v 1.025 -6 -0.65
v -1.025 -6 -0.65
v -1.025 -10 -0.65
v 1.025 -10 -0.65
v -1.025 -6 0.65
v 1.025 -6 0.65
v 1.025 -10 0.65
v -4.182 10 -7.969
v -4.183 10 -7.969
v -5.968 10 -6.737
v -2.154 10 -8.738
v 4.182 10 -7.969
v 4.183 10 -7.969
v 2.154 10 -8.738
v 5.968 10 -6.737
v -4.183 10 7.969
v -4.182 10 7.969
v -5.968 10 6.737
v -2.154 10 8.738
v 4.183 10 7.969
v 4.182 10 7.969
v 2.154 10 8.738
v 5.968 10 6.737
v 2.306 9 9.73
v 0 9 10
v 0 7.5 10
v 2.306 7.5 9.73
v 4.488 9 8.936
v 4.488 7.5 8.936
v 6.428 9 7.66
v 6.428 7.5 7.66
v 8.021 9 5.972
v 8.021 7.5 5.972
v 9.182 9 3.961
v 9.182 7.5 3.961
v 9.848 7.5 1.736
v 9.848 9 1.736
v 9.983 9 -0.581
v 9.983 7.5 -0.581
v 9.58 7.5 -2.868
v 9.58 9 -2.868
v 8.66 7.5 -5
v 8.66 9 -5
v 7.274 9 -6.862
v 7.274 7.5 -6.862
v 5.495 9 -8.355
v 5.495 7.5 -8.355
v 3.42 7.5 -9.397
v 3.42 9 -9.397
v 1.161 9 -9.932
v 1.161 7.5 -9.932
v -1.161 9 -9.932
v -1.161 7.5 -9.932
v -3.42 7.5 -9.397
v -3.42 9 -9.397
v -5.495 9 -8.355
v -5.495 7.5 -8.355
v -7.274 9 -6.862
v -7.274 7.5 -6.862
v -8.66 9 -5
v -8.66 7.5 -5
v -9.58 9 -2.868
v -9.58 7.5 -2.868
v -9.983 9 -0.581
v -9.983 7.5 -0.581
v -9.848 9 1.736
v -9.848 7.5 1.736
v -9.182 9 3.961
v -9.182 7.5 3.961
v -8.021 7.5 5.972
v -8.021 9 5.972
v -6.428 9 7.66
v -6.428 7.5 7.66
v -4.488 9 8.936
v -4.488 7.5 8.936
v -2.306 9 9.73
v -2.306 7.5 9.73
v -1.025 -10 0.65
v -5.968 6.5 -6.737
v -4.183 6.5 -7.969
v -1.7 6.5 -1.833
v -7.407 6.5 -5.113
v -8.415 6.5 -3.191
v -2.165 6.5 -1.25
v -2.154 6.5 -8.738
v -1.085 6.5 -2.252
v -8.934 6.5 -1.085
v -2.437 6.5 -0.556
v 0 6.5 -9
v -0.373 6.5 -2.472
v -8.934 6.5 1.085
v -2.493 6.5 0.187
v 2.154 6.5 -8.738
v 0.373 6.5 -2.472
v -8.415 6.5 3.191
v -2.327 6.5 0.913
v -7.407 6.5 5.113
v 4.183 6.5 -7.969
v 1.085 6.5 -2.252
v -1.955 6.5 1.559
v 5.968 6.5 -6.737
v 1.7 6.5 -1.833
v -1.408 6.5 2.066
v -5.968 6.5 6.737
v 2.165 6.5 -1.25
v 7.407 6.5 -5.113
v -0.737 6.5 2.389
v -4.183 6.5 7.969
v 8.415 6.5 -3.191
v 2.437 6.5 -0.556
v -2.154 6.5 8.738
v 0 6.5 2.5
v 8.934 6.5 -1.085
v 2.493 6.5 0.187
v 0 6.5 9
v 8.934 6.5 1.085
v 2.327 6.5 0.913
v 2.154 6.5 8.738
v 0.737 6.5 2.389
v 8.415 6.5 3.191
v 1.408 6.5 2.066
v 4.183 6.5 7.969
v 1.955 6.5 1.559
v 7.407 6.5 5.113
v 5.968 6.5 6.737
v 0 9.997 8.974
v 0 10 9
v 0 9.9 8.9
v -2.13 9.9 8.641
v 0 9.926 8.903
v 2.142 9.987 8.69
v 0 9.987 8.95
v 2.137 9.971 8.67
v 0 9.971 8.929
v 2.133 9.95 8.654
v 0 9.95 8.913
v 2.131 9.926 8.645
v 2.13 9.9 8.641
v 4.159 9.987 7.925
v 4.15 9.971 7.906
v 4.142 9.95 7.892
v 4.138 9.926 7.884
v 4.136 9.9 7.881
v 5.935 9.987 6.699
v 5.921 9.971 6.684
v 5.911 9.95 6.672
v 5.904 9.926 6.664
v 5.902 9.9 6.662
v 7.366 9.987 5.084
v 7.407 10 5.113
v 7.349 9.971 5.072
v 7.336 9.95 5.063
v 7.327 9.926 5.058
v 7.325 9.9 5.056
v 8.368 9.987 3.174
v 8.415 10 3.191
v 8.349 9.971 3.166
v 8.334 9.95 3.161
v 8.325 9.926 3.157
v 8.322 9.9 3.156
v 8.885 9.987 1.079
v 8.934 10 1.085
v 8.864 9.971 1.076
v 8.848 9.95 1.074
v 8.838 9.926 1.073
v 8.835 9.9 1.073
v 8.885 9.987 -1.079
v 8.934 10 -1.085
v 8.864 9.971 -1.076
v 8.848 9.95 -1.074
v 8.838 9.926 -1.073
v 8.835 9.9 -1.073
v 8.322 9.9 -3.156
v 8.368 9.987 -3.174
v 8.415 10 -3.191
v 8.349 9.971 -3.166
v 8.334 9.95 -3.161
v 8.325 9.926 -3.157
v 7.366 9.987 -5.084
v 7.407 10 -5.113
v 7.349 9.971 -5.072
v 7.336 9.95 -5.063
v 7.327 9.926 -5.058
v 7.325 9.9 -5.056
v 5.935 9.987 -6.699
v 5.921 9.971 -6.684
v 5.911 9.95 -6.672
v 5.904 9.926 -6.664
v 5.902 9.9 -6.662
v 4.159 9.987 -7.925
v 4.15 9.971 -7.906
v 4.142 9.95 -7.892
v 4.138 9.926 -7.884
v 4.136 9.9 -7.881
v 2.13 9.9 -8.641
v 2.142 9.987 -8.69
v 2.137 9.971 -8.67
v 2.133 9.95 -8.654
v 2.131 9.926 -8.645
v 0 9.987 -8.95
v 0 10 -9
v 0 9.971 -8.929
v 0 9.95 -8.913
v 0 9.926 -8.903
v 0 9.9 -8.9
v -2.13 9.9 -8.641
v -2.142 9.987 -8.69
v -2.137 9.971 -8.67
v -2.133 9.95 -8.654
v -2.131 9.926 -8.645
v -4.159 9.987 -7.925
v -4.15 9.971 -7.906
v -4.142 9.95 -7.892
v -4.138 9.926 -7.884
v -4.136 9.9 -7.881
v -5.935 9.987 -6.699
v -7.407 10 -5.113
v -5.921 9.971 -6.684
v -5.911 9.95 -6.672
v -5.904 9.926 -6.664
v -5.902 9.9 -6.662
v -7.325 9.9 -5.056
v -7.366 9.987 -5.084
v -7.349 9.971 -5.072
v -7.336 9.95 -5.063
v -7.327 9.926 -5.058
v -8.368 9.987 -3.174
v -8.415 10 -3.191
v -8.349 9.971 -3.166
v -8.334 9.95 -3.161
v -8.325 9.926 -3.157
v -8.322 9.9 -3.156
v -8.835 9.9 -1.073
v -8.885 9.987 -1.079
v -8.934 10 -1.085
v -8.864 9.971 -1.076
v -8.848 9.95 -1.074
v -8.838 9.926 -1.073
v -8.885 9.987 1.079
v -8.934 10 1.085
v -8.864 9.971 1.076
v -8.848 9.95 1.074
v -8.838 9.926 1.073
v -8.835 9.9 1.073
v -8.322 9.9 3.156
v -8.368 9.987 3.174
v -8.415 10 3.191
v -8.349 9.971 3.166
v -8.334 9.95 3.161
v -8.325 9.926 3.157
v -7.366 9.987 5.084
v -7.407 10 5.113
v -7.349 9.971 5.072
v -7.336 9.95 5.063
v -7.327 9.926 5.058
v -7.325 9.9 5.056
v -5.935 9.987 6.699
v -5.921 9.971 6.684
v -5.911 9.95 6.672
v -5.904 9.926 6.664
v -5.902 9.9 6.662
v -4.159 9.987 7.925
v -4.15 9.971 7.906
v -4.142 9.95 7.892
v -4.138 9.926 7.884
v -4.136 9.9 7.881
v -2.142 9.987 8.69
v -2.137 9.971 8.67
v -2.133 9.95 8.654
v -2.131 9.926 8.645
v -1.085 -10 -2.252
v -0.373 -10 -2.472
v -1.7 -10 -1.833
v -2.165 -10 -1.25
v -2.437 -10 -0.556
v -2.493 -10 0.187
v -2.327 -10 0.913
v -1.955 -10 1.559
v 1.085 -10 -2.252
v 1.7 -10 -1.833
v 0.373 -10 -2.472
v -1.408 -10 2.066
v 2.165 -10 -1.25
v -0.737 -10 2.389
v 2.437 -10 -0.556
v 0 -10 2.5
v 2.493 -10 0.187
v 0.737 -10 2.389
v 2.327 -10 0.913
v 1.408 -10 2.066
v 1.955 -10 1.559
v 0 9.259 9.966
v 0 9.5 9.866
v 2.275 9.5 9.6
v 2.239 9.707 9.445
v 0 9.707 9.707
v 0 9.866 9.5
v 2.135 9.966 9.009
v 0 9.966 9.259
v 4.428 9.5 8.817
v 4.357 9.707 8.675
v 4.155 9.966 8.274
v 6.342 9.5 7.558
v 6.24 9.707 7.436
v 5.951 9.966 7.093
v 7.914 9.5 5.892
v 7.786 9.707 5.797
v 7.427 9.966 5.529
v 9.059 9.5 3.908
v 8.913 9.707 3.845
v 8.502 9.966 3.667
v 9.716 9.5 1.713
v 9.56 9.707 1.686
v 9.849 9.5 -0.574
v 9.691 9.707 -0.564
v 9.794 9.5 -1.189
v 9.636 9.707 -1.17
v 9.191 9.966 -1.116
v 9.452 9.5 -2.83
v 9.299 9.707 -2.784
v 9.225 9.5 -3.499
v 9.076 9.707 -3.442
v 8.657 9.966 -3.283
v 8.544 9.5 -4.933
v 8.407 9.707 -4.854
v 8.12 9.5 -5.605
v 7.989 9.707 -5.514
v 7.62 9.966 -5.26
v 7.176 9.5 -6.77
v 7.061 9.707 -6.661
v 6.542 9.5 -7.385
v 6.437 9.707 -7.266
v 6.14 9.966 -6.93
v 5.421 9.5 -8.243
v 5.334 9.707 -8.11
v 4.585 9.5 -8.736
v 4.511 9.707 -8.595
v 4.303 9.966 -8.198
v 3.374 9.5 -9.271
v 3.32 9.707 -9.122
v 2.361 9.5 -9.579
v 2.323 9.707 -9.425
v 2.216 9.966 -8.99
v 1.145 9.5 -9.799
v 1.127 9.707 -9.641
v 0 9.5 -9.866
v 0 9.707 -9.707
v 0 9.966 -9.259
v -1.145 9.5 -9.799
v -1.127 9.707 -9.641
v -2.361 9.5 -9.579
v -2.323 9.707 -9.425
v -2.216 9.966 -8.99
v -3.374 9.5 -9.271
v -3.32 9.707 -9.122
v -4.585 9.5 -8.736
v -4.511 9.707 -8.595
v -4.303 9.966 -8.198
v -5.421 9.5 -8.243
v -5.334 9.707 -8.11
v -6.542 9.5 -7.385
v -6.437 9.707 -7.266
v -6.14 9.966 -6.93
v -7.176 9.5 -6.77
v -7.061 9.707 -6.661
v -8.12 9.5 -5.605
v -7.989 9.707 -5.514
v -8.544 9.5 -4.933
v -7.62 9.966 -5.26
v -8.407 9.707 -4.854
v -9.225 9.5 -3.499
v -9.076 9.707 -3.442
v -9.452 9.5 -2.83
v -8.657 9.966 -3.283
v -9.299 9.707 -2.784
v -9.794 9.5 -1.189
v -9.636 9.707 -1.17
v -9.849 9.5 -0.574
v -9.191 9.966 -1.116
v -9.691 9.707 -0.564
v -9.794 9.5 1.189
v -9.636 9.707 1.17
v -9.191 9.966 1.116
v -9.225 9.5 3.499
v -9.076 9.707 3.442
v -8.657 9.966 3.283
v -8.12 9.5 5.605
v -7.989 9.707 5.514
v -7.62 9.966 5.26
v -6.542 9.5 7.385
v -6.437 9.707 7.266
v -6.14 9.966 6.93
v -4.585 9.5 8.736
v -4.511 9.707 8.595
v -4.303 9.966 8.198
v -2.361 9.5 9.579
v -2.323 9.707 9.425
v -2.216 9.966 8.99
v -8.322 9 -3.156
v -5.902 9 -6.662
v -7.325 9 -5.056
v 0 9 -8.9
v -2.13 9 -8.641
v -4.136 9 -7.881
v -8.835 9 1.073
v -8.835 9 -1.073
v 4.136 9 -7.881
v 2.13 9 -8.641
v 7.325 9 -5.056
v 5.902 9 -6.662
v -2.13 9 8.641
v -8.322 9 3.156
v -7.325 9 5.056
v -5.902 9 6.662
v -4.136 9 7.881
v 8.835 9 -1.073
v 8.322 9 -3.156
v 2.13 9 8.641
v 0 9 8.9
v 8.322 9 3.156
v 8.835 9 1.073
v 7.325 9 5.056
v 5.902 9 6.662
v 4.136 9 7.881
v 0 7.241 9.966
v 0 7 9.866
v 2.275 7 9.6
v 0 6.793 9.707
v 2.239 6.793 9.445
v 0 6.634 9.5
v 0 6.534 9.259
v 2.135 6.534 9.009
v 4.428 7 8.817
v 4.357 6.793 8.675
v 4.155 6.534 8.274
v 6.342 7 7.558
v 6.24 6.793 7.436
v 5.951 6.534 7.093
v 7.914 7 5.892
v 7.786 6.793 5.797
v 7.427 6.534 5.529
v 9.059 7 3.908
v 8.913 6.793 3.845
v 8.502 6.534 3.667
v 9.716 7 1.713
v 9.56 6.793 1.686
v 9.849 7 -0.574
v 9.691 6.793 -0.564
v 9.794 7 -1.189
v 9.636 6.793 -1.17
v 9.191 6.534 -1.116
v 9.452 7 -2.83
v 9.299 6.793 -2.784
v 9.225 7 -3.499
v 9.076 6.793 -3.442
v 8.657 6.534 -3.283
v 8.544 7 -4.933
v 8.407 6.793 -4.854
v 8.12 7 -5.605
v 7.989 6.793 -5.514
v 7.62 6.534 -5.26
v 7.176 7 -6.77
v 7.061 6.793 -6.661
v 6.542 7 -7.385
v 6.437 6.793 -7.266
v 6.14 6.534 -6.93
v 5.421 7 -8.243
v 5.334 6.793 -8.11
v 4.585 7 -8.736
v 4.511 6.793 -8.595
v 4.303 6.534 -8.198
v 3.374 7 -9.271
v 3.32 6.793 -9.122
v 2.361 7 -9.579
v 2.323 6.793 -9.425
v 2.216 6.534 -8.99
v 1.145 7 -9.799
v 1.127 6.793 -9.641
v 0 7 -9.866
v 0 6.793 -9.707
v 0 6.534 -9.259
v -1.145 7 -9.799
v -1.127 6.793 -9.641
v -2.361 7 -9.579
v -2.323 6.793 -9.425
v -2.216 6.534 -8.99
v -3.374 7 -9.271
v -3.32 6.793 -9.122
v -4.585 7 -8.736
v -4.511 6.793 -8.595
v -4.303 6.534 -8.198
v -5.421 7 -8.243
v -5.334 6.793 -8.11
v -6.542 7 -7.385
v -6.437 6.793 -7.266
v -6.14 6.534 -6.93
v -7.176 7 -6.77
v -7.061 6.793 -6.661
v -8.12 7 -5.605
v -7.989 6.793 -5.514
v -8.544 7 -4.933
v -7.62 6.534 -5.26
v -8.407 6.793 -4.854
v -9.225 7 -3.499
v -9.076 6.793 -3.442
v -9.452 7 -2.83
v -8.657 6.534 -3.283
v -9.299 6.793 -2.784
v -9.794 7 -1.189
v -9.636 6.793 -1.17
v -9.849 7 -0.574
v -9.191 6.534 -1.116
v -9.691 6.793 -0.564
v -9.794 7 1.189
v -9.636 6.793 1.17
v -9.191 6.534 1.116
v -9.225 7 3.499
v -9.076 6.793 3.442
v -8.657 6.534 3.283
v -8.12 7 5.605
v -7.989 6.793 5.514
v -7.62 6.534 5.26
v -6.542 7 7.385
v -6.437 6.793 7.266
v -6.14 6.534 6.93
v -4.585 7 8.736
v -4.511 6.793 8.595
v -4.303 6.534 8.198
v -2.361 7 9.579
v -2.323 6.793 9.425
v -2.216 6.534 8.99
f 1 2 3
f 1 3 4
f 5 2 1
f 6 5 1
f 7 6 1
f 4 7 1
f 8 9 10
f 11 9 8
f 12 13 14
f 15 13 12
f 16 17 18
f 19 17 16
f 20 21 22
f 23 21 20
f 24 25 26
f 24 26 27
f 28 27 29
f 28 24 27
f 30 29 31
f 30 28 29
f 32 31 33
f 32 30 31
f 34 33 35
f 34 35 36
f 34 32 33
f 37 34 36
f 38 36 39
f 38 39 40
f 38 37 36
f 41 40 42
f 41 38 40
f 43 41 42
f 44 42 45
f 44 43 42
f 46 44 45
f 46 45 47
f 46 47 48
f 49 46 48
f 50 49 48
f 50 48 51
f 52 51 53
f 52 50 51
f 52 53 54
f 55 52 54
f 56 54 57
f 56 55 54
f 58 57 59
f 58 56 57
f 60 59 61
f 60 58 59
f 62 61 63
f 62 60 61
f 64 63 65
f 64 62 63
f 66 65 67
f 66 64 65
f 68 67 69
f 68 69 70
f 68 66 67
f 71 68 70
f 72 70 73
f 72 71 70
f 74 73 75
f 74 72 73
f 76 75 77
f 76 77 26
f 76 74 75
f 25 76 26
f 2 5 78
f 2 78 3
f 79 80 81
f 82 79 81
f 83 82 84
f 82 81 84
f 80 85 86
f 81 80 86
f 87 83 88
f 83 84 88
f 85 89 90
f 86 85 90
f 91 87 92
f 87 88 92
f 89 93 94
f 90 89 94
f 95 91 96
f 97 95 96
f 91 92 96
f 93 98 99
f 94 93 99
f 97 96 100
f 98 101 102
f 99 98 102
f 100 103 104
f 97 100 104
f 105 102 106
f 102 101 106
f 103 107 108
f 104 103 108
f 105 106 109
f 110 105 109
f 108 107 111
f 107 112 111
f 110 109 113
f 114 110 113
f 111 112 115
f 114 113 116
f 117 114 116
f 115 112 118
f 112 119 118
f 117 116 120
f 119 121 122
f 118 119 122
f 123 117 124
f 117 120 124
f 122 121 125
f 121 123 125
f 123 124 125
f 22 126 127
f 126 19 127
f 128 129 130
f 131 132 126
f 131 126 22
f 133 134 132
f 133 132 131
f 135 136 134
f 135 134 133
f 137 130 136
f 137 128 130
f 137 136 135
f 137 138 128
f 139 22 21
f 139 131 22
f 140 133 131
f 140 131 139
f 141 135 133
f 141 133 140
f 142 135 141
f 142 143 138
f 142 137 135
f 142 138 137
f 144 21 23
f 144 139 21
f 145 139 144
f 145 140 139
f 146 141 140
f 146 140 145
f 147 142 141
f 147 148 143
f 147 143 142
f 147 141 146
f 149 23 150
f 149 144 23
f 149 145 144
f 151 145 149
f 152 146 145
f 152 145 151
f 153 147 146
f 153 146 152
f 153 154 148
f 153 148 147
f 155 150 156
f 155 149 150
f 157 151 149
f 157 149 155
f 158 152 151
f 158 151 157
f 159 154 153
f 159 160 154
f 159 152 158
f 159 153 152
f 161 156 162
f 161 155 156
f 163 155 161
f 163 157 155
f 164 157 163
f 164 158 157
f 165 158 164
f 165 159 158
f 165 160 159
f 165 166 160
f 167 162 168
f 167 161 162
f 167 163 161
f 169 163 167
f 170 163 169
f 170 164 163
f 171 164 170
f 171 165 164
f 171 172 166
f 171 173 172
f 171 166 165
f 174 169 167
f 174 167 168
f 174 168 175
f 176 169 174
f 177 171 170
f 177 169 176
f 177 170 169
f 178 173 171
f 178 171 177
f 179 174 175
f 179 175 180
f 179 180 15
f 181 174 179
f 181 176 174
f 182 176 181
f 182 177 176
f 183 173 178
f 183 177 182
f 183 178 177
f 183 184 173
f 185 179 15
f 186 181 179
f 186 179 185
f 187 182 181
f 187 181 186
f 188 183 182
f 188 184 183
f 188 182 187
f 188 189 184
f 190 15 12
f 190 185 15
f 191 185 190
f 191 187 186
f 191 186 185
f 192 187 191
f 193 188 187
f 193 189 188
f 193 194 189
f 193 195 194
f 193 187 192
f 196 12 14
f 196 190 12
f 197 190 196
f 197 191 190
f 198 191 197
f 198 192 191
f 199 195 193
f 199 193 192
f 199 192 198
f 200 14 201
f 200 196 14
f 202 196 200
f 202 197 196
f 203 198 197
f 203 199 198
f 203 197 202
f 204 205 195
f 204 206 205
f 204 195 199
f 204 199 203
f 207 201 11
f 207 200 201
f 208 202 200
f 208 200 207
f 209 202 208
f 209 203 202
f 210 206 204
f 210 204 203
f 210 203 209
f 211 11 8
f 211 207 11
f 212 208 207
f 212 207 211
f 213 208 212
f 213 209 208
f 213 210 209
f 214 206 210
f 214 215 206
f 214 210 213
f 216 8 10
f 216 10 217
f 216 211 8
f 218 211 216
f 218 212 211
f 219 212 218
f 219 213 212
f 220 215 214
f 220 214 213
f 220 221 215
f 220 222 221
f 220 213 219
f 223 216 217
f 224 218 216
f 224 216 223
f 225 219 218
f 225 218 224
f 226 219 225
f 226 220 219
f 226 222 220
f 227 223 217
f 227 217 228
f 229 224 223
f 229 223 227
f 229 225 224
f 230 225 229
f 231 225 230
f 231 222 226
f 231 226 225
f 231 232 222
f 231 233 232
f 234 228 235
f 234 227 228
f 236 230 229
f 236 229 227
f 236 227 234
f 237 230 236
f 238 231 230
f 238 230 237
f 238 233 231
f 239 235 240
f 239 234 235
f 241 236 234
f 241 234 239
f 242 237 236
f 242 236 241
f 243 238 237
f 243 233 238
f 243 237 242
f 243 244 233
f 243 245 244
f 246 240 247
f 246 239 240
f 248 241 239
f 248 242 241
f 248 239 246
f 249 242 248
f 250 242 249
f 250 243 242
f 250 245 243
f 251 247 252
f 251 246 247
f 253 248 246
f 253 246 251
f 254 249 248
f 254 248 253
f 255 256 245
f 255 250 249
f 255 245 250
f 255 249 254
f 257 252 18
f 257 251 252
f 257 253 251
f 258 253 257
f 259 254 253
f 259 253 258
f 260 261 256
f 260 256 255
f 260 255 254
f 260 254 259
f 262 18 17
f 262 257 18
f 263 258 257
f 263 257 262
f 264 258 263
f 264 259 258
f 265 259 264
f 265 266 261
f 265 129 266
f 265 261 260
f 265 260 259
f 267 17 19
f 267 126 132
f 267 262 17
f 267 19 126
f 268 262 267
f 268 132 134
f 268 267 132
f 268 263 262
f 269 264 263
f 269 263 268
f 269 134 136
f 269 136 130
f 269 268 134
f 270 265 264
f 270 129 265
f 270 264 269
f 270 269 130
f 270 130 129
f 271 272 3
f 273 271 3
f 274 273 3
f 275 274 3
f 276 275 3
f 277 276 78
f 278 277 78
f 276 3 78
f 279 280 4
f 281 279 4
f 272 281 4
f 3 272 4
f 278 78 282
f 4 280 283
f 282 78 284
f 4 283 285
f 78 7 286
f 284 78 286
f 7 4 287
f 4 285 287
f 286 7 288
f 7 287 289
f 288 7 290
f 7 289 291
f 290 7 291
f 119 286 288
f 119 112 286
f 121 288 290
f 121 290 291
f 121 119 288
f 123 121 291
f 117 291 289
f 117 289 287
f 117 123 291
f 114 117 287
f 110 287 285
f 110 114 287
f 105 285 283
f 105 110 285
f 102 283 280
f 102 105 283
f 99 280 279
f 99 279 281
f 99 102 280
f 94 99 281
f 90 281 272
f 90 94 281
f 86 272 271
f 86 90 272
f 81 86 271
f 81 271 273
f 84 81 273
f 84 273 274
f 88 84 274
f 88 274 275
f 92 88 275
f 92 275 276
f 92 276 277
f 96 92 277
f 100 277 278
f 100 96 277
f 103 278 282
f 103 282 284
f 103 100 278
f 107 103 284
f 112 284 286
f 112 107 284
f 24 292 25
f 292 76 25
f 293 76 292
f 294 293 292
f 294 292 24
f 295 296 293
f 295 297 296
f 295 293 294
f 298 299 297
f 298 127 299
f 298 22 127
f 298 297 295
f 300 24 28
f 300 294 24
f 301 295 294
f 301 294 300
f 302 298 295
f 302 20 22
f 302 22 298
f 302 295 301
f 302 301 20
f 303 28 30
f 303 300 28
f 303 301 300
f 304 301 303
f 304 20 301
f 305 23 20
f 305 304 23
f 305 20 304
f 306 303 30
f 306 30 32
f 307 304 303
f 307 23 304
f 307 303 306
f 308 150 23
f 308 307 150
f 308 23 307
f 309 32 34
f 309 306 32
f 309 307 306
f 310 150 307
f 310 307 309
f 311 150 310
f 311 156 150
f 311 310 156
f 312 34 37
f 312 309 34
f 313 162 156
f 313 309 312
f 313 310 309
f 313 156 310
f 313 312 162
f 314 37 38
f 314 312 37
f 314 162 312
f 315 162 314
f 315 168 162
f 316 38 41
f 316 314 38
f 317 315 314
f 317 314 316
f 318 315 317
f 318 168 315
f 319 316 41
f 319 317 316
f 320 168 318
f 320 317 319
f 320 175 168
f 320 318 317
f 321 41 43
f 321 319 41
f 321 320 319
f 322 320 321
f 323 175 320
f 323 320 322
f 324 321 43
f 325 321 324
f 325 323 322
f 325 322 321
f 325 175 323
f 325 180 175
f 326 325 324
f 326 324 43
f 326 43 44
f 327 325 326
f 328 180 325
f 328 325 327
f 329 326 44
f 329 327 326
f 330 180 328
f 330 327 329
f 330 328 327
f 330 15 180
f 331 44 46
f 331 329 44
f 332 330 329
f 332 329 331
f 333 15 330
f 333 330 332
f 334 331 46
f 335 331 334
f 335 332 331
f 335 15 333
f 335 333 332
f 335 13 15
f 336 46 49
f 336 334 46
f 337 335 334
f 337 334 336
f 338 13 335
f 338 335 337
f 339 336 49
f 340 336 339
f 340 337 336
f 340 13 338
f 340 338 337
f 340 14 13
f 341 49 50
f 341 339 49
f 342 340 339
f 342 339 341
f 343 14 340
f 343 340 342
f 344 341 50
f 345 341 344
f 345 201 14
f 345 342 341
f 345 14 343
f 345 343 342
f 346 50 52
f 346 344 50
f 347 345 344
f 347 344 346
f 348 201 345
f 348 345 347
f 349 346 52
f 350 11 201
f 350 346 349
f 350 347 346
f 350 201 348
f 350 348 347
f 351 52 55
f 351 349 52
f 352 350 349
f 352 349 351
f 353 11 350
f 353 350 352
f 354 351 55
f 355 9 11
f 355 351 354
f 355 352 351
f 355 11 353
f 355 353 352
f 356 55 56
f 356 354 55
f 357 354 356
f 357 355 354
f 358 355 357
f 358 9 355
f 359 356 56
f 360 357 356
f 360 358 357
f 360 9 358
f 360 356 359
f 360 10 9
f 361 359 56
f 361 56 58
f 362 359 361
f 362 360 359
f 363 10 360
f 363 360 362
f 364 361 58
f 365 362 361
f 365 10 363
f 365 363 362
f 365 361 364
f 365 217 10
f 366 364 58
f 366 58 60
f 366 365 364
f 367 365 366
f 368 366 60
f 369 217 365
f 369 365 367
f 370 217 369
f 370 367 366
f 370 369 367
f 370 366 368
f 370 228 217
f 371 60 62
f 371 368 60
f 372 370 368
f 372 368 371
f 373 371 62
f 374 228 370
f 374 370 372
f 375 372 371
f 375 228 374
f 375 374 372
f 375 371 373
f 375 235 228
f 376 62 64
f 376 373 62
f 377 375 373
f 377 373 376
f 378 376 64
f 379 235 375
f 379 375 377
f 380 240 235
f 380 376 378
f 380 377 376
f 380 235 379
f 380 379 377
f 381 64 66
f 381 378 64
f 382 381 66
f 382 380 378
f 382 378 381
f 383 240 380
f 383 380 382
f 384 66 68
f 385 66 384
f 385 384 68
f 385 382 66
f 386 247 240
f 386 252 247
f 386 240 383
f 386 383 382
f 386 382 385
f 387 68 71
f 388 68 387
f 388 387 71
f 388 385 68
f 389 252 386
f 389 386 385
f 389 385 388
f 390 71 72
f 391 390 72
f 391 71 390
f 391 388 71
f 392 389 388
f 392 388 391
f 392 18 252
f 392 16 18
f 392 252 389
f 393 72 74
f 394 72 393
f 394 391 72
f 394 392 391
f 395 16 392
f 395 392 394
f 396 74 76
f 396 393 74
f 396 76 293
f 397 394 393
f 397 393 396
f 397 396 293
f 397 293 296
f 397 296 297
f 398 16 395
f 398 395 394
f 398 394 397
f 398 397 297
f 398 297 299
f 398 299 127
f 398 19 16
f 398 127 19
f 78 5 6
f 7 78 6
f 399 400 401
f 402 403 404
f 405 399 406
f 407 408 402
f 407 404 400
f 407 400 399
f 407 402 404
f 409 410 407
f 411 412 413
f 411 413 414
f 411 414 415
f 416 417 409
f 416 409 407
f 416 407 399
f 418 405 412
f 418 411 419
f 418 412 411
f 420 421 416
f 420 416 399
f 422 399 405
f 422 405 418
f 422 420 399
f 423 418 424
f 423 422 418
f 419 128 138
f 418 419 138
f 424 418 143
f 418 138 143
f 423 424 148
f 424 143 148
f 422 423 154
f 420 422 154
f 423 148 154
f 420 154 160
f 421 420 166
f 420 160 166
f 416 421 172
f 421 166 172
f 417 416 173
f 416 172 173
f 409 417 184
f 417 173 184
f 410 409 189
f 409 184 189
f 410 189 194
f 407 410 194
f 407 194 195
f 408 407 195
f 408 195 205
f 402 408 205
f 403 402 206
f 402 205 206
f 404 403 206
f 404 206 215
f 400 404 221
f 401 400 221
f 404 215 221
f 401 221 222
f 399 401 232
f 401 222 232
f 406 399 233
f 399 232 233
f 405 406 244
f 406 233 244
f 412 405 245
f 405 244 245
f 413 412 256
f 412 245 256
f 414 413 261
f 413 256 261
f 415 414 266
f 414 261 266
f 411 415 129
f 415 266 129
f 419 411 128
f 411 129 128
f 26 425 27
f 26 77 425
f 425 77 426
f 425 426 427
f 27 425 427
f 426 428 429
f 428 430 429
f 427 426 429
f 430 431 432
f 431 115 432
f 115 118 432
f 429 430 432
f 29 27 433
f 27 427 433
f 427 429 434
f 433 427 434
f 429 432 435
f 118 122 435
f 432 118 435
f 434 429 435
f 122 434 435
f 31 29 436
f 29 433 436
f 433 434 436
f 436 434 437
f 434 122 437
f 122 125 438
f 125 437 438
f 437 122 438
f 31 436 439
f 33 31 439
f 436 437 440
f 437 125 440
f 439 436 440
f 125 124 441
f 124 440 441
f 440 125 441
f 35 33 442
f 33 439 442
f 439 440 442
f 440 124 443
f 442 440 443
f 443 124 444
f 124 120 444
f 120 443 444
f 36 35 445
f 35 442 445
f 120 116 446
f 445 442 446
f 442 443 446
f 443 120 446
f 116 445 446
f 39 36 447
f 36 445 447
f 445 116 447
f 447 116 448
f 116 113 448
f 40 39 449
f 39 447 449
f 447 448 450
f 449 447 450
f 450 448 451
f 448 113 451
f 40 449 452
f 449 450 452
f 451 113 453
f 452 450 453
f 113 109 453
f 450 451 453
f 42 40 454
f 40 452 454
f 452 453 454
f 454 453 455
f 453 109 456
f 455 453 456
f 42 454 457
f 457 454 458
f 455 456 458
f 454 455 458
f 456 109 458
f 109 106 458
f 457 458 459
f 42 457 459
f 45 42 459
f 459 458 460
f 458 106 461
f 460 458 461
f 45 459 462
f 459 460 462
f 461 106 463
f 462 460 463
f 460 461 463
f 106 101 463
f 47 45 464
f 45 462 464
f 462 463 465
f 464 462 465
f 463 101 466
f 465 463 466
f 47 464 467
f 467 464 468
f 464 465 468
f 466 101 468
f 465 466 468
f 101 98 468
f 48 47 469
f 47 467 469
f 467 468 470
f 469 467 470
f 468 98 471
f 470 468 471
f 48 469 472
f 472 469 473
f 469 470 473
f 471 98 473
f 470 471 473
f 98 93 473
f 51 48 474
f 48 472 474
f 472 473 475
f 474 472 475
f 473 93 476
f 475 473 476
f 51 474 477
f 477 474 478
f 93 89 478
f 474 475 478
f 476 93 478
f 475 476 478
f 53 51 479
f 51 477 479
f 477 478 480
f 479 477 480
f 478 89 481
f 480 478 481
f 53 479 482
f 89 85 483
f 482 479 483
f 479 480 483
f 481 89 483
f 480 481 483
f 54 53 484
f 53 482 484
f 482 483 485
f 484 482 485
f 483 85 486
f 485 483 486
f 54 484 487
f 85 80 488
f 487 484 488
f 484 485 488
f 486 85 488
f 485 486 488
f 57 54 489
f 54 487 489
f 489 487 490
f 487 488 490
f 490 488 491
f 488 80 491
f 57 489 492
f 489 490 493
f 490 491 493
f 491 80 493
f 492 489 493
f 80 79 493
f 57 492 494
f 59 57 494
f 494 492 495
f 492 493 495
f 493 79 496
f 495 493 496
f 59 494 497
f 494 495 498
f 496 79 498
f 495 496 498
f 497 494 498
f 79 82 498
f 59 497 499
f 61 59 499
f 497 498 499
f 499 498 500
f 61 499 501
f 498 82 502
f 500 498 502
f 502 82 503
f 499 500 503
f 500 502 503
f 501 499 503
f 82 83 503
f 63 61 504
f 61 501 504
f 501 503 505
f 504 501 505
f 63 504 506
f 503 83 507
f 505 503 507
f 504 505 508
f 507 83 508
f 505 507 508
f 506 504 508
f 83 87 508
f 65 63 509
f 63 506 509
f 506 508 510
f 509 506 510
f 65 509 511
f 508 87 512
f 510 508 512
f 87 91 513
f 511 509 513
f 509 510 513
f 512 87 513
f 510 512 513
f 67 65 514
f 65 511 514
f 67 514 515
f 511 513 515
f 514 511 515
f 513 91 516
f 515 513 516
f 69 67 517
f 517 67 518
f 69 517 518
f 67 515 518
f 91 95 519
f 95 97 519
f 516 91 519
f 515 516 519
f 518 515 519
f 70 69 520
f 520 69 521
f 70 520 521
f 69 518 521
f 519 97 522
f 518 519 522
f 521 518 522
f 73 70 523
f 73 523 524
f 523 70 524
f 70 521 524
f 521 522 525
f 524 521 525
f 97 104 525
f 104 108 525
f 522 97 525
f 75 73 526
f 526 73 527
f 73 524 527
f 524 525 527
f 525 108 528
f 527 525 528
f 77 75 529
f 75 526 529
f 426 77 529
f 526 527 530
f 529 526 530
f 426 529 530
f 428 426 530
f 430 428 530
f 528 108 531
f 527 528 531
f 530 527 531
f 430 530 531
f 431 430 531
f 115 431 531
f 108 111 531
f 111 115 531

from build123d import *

# Parameters (mm, degrees)
SKETCH2_R           = 2.5
SKETCH2_W           = 2.05
SKETCH2_H           = 1.3
BOSS_EXTRUDE1_DEPTH = 10
FILLET1_R           = 1
SKETCH3_W           = 2.05
SKETCH3_H           = 1.3
BOSS_EXTRUDE5_DEPTH = 16
SKETCH4_R           = 10
THUMB_STICK_DEPTH   = 3.5
FILLET2_R           = 1
FILLET3_R           = 1
SKETCH4_4_R         = 8.9
CUT_EXTRUDE1_DEPTH  = 1
FILLET5_R           = 0.1


with BuildPart() as part:
    # Sketch2 → Boss-Extrude1 (new, symmetric)
    with BuildSketch(Plane(origin=(0, 0, 0), x_dir=(1, 0, 0), z_dir=(0, 1, 0))):
        with Locations(Location((0, 0, 0), (0, 0, 270))):
            Circle(SKETCH2_R)
        Rectangle(SKETCH2_W, SKETCH2_H, mode=Mode.SUBTRACT)
    extrude(amount=BOSS_EXTRUDE1_DEPTH, both=True)

    # Fillet1
    fillet1_edges = [part.edges().sort_by_distance(p)[0] for p in [
        (0, 10, -2.5),
    ]]
    fillet(fillet1_edges, radius=FILLET1_R)

    # Sketch3 → Boss-Extrude5 (add)
    with BuildSketch(Plane(origin=(0, 10, 0), x_dir=(1, 0, 0), z_dir=(0, 1, 0))):
        Rectangle(SKETCH3_W, SKETCH3_H)
    extrude(amount=-BOSS_EXTRUDE5_DEPTH)

    # Sketch4 → Thumb Stick (add)
    with BuildSketch(Plane(origin=(0, 10, 0), x_dir=(1, 0, 0), z_dir=(0, 1, 0))):
        with Locations(Location((0, 0, 0), (0, 0, 270))):
            Circle(SKETCH4_R)
    extrude(amount=-THUMB_STICK_DEPTH)

    # Fillet2
    fillet2_edges = [part.edges().sort_by_distance(p)[0] for p in [
        (0, 6.5, -10),
    ]]
    fillet(fillet2_edges, radius=FILLET2_R)

    # Fillet3
    fillet3_edges = [part.edges().sort_by_distance(p)[0] for p in [
        (0, 10, -10),
    ]]
    fillet(fillet3_edges, radius=FILLET3_R)

    # Sketch4<4> → Cut-Extrude1 (cut)
    with BuildSketch(Plane(origin=(0, 10, 0), x_dir=(1, 0, 0), z_dir=(0, 1, 0))):
        with Locations(Location((0, 0, 0), (0, 0, 270))):
            Circle(SKETCH4_4_R)
    extrude(amount=-CUT_EXTRUDE1_DEPTH, mode=Mode.SUBTRACT)

    # Fillet5
    fillet5_edges = [part.edges().sort_by_distance(p)[0] for p in [
        (0, 10, -8.9),
    ]]
    fillet(fillet5_edges, radius=FILLET5_R - 0.0001)  # a hair under: the kernel refuses the full size


solid = part.part
